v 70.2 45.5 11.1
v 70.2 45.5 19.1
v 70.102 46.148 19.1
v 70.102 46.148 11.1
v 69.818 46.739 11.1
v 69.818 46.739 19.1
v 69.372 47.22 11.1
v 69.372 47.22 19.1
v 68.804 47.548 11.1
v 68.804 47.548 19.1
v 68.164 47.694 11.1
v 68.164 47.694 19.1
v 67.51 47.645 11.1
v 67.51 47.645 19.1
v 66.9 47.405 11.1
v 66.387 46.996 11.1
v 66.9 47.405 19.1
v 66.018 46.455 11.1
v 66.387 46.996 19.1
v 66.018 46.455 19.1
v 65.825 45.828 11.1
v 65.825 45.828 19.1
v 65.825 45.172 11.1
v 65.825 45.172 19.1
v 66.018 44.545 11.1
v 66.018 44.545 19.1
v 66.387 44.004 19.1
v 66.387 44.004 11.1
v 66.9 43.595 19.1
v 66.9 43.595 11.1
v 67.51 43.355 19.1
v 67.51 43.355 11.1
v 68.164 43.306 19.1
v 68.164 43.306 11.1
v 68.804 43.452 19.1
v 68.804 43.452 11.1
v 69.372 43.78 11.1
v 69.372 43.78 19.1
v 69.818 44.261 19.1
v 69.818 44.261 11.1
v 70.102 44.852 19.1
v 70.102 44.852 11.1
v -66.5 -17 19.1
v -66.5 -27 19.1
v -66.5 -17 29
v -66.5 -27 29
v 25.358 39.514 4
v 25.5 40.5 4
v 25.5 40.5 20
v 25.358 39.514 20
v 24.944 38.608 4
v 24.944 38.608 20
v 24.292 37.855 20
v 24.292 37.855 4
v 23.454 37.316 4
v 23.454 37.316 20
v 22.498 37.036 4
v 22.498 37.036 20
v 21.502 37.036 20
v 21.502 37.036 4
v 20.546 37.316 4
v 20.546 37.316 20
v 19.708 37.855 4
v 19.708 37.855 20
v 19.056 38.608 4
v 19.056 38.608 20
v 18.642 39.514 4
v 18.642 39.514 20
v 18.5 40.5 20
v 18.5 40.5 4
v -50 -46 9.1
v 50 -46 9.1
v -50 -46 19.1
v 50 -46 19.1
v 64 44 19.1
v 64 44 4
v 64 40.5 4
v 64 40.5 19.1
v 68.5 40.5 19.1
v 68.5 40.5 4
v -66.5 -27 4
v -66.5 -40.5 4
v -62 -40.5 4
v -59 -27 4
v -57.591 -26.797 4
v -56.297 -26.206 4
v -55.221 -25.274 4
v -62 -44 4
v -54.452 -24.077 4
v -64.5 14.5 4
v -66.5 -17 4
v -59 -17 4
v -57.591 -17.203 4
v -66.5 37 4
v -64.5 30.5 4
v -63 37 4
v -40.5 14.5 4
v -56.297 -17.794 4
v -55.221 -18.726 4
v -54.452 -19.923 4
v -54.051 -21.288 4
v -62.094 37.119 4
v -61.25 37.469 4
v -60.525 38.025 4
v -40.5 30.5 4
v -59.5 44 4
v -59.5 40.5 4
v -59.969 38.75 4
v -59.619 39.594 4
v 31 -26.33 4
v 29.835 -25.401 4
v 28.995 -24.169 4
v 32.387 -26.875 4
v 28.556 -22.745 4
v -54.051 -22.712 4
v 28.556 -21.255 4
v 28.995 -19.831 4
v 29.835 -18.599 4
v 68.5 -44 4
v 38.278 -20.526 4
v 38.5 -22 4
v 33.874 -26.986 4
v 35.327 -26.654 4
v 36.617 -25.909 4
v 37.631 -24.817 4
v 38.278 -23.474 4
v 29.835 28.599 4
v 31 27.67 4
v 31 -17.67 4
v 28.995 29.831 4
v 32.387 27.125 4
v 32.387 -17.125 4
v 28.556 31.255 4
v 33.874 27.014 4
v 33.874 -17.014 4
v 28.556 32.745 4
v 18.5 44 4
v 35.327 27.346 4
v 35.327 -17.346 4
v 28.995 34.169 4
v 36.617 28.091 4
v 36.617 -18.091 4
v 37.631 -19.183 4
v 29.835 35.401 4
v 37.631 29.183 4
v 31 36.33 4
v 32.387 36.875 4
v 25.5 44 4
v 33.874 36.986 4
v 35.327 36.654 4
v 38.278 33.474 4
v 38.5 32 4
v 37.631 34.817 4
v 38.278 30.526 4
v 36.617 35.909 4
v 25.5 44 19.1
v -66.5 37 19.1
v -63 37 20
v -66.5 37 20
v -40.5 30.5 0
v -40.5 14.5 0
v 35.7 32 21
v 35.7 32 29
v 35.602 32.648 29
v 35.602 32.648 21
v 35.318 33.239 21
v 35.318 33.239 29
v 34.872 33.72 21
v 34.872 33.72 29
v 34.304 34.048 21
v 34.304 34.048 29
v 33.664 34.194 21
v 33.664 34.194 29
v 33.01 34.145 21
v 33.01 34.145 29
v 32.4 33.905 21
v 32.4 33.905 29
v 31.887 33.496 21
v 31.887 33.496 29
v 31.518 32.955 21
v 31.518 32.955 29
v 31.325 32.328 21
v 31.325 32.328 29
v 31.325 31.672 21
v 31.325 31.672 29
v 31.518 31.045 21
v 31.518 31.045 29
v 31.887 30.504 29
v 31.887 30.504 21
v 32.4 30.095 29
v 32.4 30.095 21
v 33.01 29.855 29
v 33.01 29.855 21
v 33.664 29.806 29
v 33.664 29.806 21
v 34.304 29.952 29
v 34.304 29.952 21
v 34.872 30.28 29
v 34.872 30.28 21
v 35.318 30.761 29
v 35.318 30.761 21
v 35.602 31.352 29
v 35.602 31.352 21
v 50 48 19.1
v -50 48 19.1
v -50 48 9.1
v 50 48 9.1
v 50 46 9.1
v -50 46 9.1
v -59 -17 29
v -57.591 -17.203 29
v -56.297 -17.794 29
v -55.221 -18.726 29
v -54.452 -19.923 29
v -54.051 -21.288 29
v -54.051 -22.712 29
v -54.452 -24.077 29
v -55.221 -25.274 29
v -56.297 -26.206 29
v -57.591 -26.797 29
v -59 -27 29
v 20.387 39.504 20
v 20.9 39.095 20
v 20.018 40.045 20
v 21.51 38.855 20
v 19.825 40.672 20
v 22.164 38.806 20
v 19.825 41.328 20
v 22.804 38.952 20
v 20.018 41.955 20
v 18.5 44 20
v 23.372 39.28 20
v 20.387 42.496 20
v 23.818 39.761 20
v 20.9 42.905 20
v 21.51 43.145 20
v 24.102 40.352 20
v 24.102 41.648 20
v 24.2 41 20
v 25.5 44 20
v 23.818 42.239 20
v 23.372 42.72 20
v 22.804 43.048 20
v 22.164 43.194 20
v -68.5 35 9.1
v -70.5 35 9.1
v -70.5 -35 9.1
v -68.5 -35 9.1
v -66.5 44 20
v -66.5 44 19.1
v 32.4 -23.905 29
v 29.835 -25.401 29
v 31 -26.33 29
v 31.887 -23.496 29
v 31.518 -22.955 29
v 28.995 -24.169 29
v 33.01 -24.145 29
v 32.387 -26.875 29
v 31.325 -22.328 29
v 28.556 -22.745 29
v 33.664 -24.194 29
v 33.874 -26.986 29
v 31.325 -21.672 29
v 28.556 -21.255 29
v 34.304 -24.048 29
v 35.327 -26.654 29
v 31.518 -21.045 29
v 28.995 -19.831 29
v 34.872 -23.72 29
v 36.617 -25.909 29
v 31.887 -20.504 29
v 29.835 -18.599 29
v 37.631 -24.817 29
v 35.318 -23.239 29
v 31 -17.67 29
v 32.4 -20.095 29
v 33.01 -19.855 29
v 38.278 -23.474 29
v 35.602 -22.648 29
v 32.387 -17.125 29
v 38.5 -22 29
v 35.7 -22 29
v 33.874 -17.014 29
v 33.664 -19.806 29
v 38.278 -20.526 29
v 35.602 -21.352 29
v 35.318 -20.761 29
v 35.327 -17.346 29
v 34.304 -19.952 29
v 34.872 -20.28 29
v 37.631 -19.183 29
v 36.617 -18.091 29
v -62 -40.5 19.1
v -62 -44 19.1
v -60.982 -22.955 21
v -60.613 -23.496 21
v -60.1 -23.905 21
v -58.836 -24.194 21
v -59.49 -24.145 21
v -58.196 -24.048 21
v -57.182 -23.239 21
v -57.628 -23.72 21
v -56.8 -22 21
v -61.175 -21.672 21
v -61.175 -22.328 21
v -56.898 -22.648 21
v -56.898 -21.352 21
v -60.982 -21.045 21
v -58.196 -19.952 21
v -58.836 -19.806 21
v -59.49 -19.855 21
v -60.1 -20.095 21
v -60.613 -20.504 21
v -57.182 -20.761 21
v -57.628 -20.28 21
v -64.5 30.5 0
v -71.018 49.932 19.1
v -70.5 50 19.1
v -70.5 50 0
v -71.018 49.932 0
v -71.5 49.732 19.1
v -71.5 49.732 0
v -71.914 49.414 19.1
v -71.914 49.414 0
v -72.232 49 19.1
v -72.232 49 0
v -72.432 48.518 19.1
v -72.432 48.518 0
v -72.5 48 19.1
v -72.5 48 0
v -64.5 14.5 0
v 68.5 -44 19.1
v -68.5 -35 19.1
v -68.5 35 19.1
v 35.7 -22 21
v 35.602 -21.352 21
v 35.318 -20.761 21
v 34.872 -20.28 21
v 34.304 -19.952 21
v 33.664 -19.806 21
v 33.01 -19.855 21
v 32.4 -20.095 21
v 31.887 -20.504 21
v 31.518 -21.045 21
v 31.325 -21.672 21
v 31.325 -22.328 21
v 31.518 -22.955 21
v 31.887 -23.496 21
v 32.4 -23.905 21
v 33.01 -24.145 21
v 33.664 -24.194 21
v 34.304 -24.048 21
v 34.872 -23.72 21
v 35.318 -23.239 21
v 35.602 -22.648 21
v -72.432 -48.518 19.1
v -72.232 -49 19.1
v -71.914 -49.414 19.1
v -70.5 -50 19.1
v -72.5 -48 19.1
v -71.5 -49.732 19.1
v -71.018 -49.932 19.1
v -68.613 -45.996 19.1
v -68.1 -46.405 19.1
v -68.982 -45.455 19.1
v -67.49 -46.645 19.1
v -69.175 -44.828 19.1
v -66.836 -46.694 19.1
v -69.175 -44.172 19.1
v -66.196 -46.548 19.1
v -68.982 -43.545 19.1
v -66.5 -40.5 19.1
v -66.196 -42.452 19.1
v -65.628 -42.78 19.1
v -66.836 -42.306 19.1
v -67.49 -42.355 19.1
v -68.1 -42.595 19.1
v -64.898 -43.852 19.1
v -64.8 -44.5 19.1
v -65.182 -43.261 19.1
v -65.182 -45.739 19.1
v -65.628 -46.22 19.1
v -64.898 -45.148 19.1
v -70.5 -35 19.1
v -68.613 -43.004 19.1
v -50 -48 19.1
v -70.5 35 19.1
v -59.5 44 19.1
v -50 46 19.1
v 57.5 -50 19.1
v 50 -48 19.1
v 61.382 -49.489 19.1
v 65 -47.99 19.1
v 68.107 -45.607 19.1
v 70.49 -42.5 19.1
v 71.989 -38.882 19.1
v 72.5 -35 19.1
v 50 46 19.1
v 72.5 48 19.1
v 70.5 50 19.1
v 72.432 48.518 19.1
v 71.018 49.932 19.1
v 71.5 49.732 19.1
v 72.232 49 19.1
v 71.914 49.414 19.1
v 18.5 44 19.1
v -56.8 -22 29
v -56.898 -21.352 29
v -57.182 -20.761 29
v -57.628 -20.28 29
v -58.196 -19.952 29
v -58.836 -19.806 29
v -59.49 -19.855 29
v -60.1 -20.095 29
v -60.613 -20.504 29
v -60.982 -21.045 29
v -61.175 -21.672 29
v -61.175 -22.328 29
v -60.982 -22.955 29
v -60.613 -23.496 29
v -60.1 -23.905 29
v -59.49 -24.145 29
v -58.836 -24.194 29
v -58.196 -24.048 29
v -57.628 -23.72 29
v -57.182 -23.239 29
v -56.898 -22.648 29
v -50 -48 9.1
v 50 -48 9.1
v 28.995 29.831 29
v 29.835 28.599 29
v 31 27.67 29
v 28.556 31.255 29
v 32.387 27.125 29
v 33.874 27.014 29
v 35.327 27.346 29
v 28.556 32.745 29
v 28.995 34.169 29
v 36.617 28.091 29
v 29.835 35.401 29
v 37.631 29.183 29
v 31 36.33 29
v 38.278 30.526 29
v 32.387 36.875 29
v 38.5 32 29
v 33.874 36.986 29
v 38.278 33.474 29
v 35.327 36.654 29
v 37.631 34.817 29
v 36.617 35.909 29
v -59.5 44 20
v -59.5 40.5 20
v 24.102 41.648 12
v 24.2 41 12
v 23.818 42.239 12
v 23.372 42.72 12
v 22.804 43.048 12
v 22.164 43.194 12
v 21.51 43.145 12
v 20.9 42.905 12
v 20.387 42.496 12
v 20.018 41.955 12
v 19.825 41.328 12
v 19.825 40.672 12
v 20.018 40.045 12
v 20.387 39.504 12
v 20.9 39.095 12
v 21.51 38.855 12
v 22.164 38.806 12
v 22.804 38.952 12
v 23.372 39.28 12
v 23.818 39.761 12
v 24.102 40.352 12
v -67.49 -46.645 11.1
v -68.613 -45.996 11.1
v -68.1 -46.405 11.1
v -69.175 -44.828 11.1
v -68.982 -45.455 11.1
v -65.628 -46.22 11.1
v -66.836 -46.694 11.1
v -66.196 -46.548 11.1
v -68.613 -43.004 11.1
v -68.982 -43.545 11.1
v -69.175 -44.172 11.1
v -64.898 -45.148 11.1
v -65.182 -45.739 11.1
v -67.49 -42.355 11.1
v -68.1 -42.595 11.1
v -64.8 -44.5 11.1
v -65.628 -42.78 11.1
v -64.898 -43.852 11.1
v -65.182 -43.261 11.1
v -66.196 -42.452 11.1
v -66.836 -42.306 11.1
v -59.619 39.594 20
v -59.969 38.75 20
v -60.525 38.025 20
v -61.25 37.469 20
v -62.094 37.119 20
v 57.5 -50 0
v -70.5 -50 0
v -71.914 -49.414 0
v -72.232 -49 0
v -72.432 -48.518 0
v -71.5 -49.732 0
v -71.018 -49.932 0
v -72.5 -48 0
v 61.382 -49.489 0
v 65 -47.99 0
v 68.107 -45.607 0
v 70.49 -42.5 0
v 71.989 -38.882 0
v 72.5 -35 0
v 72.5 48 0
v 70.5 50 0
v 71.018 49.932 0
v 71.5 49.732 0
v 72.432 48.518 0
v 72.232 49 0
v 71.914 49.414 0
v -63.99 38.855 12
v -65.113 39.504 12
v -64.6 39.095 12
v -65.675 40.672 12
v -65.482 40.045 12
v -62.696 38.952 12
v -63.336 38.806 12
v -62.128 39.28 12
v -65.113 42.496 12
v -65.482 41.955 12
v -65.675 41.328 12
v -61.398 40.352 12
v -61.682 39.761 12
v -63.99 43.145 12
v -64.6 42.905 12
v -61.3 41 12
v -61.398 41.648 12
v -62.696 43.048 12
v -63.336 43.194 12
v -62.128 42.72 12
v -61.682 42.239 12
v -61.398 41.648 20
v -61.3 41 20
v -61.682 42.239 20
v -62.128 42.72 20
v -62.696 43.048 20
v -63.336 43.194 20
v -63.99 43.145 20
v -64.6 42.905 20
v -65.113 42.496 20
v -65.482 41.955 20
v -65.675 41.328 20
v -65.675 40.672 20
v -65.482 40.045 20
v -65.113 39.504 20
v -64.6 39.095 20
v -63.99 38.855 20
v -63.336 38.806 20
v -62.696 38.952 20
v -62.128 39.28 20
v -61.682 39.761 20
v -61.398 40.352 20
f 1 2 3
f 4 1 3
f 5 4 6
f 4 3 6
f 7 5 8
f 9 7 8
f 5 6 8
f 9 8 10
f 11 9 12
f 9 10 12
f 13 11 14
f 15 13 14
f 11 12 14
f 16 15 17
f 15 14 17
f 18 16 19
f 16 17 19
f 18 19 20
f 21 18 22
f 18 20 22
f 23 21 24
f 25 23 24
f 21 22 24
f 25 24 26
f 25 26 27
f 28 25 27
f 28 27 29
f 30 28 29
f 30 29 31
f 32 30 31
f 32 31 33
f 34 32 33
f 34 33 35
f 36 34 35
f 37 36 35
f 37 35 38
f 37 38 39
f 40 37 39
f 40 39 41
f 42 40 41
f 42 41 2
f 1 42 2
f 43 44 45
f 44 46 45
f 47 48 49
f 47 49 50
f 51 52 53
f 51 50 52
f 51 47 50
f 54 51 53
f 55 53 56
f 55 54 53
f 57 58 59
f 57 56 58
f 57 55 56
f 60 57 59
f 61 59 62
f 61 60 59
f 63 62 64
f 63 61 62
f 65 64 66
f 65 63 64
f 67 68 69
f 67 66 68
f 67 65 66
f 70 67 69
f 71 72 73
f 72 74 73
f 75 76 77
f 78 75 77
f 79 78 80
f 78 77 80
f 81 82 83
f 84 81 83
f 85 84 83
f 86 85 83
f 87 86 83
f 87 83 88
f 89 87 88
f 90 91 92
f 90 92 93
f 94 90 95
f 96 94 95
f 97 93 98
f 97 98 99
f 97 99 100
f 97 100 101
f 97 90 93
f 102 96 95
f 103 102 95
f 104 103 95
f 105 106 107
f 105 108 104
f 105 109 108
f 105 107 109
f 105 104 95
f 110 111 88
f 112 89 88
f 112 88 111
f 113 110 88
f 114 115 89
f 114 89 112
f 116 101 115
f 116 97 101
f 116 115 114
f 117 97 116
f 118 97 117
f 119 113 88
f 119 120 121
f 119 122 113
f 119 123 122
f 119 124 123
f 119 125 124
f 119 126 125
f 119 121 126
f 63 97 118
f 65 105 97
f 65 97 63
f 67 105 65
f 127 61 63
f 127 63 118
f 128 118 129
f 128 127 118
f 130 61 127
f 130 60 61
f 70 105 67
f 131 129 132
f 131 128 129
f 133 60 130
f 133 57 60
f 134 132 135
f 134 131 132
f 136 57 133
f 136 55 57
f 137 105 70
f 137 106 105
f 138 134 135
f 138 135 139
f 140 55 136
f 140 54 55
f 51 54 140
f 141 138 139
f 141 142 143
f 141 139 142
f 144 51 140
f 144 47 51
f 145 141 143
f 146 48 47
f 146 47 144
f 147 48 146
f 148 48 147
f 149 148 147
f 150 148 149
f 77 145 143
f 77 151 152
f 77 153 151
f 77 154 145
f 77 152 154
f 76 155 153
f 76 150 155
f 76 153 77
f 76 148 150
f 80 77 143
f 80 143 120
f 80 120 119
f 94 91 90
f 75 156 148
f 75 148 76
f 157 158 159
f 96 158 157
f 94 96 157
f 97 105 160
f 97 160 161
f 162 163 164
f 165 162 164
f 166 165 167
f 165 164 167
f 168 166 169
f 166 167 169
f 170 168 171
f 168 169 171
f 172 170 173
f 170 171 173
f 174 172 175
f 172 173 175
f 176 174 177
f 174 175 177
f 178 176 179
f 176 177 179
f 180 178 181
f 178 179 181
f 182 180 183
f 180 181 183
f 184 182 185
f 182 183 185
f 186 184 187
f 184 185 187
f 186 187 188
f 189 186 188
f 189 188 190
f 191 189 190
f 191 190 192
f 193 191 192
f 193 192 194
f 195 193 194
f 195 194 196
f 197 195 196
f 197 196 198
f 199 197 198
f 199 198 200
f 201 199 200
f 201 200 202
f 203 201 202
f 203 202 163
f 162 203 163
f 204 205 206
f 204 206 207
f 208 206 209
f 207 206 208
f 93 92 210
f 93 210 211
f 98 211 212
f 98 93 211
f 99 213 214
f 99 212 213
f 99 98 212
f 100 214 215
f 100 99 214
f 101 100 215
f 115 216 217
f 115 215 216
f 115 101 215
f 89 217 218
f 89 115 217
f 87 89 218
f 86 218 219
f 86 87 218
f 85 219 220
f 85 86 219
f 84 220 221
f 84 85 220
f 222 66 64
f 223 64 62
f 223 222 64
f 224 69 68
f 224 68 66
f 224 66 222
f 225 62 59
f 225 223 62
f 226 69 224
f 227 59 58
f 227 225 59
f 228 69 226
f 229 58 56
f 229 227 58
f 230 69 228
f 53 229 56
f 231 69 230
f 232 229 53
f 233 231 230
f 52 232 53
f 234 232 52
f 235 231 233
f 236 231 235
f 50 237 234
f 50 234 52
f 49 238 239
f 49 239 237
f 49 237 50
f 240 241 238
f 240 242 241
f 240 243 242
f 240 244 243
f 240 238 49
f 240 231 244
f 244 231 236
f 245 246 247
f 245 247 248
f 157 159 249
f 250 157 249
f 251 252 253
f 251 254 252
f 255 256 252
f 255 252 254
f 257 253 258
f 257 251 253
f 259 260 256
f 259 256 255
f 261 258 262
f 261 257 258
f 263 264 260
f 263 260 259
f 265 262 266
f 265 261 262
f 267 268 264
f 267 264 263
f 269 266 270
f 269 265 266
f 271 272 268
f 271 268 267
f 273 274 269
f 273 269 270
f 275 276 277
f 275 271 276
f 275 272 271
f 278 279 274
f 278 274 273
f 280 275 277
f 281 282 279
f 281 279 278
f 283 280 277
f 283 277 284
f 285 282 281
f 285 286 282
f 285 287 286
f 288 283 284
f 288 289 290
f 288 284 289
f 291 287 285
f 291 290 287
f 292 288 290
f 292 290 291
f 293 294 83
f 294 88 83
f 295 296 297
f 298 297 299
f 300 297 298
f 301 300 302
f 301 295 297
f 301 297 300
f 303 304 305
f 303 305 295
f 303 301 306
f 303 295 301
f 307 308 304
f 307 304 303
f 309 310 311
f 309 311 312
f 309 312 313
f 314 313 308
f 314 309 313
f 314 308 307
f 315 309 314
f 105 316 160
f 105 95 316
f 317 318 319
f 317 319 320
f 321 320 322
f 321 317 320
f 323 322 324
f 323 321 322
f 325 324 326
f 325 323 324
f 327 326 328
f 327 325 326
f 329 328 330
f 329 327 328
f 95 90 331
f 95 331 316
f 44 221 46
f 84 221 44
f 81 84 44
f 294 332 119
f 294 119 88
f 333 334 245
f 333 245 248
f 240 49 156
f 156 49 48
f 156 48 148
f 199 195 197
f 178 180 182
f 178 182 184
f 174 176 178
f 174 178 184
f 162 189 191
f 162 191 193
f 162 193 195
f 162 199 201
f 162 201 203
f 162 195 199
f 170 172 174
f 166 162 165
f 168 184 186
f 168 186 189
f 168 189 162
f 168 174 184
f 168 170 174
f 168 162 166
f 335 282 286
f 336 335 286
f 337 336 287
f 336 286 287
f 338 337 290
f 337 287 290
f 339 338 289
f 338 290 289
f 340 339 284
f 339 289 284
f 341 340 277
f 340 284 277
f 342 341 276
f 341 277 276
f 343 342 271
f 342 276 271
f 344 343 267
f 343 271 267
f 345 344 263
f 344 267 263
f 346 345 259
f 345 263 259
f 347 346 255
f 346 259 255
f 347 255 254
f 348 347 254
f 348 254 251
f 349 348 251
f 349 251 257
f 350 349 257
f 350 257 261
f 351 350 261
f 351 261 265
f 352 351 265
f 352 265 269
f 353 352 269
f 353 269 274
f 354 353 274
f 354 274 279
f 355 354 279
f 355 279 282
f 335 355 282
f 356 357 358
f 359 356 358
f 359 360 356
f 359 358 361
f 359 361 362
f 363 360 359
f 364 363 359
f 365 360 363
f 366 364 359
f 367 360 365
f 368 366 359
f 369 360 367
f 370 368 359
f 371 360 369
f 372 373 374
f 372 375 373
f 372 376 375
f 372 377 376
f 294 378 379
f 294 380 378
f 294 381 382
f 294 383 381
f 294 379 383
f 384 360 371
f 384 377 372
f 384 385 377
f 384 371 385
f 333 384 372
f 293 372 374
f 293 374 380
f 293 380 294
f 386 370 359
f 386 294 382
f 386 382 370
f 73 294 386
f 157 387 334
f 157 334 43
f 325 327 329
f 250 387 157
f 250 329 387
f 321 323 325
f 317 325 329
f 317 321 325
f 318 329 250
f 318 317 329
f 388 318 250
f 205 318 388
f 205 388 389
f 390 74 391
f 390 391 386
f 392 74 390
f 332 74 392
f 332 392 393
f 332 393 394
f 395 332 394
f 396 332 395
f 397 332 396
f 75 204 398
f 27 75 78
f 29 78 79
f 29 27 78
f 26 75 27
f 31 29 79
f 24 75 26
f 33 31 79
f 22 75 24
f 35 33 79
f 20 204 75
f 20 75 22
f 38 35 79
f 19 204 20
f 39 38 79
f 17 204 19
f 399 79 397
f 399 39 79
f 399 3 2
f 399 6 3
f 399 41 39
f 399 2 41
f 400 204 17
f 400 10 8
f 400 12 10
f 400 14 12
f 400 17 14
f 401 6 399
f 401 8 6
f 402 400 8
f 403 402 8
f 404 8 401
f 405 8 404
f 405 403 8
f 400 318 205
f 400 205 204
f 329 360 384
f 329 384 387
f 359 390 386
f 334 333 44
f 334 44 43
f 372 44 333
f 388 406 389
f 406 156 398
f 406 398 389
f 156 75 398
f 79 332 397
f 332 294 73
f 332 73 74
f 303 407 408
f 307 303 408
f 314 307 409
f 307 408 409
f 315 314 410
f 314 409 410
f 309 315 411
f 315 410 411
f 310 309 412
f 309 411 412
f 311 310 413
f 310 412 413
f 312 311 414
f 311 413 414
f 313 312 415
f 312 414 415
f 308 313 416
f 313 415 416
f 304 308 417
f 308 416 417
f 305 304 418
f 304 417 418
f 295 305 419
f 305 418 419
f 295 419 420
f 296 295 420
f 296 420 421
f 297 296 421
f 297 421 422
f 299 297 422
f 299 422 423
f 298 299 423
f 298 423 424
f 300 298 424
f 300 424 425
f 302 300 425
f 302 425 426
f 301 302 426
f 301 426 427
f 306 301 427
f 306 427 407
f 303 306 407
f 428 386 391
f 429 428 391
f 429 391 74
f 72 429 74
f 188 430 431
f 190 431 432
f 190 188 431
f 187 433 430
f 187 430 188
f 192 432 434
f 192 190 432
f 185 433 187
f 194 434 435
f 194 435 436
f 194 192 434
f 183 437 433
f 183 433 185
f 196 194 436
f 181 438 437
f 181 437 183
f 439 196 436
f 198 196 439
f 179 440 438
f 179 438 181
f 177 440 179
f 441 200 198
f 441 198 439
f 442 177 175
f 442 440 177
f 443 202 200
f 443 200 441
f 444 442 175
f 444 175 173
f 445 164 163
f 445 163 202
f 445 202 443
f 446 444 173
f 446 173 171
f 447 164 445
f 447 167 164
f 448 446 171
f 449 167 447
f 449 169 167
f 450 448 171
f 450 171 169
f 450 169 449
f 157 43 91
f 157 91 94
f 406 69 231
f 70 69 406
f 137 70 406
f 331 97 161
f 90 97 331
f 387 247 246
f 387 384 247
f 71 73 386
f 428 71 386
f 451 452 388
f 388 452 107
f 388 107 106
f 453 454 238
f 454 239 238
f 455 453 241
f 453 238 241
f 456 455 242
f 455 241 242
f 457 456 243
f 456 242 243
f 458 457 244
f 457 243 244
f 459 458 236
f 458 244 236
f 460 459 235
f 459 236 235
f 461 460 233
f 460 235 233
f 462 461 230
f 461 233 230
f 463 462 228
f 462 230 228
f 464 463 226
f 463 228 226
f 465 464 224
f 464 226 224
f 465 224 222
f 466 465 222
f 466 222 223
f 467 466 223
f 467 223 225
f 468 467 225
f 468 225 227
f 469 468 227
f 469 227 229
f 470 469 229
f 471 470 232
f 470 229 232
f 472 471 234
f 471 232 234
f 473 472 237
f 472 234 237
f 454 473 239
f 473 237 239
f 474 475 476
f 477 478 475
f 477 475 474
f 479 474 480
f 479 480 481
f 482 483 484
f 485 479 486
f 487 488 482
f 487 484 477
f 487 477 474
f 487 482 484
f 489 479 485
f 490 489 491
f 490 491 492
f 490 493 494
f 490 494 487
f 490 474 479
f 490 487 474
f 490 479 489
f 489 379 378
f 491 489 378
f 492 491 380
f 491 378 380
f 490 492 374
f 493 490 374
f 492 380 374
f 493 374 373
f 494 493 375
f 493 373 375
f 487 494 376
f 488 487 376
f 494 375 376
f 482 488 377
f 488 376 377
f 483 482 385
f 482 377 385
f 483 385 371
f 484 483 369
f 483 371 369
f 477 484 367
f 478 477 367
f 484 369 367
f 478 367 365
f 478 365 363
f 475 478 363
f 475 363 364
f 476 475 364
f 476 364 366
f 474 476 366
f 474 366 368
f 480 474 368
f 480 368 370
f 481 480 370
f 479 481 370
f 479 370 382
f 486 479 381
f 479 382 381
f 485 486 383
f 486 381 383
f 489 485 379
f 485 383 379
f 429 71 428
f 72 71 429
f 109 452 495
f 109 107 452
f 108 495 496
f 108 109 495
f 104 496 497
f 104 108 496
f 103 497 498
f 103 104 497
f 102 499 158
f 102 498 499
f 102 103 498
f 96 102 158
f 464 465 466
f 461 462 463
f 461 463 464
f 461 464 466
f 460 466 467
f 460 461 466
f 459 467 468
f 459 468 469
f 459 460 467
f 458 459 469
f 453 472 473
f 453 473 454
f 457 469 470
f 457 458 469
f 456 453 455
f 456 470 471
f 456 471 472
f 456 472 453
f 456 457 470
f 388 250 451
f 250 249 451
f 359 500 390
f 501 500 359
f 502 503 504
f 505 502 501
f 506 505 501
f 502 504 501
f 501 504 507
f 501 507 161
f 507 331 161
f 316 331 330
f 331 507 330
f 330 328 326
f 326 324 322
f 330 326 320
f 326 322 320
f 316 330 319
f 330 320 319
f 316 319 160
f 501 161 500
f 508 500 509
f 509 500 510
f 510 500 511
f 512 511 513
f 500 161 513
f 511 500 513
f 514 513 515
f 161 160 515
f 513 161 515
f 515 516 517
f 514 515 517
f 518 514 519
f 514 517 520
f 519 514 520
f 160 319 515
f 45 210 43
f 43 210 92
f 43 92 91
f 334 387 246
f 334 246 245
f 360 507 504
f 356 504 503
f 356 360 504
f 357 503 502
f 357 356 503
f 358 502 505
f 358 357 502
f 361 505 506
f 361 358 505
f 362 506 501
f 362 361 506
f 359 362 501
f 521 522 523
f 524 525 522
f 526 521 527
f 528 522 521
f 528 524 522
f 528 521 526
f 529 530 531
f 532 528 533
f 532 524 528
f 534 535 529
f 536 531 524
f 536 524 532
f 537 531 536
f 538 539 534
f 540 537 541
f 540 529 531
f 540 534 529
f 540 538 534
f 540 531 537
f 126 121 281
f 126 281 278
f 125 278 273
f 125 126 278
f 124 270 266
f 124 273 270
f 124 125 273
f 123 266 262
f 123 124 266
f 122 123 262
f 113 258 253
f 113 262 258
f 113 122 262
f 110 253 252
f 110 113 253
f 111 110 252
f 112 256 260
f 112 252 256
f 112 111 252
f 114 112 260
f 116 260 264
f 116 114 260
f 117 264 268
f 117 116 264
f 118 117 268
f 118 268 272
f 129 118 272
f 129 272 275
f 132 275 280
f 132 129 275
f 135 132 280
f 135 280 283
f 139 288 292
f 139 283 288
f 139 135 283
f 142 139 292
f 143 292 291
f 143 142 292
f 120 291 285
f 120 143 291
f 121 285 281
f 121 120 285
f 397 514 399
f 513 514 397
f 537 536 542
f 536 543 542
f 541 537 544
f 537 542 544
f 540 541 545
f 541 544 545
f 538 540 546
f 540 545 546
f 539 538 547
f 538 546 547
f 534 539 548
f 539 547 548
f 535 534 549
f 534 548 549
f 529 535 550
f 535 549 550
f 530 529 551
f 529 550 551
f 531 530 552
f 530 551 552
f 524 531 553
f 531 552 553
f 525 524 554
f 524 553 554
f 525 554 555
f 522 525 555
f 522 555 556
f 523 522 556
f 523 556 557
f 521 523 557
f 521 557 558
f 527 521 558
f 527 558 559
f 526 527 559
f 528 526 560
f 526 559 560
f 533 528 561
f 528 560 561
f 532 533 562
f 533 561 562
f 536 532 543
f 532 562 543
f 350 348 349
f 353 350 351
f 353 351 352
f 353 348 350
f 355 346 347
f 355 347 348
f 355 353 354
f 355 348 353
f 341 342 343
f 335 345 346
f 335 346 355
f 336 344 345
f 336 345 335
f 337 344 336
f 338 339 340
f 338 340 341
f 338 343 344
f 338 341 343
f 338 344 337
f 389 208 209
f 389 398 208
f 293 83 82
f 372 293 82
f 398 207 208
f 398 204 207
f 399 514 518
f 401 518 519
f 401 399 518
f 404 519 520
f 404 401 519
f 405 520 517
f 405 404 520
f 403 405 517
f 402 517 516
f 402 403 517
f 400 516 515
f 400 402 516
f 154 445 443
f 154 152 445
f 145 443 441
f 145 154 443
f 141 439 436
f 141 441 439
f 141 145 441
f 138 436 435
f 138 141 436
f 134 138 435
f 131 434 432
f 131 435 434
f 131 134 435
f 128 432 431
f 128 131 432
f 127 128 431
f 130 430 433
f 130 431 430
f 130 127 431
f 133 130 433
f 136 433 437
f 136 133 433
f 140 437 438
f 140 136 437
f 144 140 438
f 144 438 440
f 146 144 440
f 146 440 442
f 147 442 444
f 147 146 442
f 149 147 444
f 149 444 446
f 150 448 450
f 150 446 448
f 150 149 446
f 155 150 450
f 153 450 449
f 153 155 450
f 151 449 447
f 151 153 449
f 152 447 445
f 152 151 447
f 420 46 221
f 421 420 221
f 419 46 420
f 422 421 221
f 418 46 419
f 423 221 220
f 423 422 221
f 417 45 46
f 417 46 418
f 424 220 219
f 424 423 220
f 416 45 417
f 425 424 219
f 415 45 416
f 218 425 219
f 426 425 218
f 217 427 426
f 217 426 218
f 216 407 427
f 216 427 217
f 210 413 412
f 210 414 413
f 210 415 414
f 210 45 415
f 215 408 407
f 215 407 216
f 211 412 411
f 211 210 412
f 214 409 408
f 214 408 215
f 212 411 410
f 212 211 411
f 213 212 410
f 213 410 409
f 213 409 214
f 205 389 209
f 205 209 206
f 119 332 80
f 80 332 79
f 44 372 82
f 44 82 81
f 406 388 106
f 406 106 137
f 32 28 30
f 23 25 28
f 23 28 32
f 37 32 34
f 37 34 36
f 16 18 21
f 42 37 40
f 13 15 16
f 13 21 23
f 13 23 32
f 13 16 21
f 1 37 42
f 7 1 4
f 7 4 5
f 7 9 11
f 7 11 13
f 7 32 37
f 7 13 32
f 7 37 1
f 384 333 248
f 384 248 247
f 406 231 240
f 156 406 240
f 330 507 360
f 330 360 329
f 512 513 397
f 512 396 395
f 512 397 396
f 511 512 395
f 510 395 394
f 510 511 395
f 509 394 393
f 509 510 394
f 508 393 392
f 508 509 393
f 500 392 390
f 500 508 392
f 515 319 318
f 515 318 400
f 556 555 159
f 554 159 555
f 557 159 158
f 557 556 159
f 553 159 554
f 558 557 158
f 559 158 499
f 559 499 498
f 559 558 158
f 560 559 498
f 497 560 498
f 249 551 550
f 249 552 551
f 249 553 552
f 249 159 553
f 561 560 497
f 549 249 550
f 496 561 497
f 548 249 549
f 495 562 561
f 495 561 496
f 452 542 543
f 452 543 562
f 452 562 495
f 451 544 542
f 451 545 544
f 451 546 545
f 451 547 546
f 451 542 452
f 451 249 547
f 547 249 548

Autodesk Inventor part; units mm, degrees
ref_plane "YZ Plane" through (0, 0, 0) normal (1, 0, 0) x (0, 1, 0)
ref_plane "XZ Plane" through (0, 0, 0) normal (0, 1, 0) x (-1, 0, 0)
ref_plane "XY Plane" through (0, 0, 0) normal (0, 0, 1) x (1, 0, 0)
sketch "Náčrt1" plane through (0, 0, 0) normal (0, 0, 1) x (1, 0, 0)
  line L0 (0, 71.6213) -> (0, -79.7279) projected
  line L1 (-102.1213, 0) -> (105.2279, 0) projected
  line L2 (-72.5, 50) -> (72.5, 50)
  line L3 (72.5, 50) -> (72.5, -35)
  line L4 (57.5, -50) -> (-72.5, -50)
  line L5 (-72.5, -50) -> (-72.5, 50)
  arc A0 (57.5, -50) -> (72.5, -35) centre (57.5, -35) ccw
  point P0 (0, 0)
  point P1 (-72.5, 0)
  point P2 (0, -50)
  point P3 (0, 50)
  point P4 (72.5, 0)
  dimension "d0" = 130
  dimension "d1" = 100
  dimension "d2" = 30
extrude "Vysunutí1" add sketch "Náčrt1" along normal blind 33
sketch "Náčrt2" plane through (0, 0, 33) normal (0, 0, 1) x (1, 0, 0)
  line L0 (-72.5, -50) -> (57.5, -50) projected
  arc A0 (57.5, -50) -> (72.5, -35) centre (57.5, -35) ccw projected
  line L1 (72.5, -35) -> (72.5, 50) projected
  line L2 (72.5, 50) -> (-72.5, 50) projected
  line L3 (-72.5, 50) -> (-72.5, -50) projected
  line L4 (-66.5, 44) -> (68.5, 44)
  line L5 (68.5, 44) -> (68.5, -31.5)
  line L6 (54, -44) -> (-66.5, -44)
  line L7 (-66.5, -44) -> (-66.5, 44)
  line L8 (54, -44) -> (68.5, -44)
  line L9 (68.5, -44) -> (68.5, -31.5)
  point P0 (0, 0)
  dimension "d5" = 4
  dimension "d6" = 6
  dimension "d7" = 6
  dimension "d8" = 6
extrude "Vysunutí2" cut sketch "Náčrt2" against normal blind 29 contours L4 L5 L9 L8 L6 L7
fillet "Zaoblení1" radius 2 1 edges at (72.5, 50, 16.5)
fillet "Zaoblení2" radius 2 2 edges at (-72.5, 50, 16.5) (-72.5, -50, 16.5)
sketch "Náčrt3" plane through (0, 0, 4) normal (0, 0, 1) x (1, 0, 0)
  line L0 (68.5, 44) -> (68.5, -44) projected
  line L1 (-66.5, 44) -> (68.5, 44) projected
  line L2 (-66.5, -44) -> (-66.5, 44) projected
  line L3 (68.5, -44) -> (-66.5, -44) projected
  arc A0 (-72.5, -48) -> (-70.5, -50) centre (-70.5, -48) ccw projected
  line L4 (-70.5, -50) -> (57.5, -50) projected
  arc A1 (57.5, -50) -> (72.5, -35) centre (57.5, -35) ccw projected
  line L5 (72.5, -35) -> (72.5, 48) projected
  arc A2 (72.5, 48) -> (70.5, 50) centre (70.5, 48) ccw projected
  line L6 (70.5, 50) -> (-70.5, 50) projected
  arc A3 (-70.5, 50) -> (-72.5, 48) centre (-70.5, 48) ccw projected
  line L7 (-72.5, 48) -> (-72.5, -48) projected
  line L8 (-66.5, 44) -> (68.5, 44) projected
  line L9 (68.5, 44) -> (68.5, -44) projected
  line L10 (68.5, -44) -> (-66.5, -44) projected
  line L11 (-66.5, -44) -> (-66.5, 44) projected
  arc A4 (-63, 37) -> (-59.5, 40.5) centre (-63, 40.5) ccw
  line L12 (-66.5, 44) -> (68.5, 44) projected
  line L13 (-66.5, -44) -> (-66.5, 44) projected
  line L14 (-59.5, 40.5) -> (-59.5, 44)
  line L15 (-63, 37) -> (-66.5, 37)
  arc A5 (18.5, 40.5) -> (25.5, 40.5) centre (22, 40.5) ccw
  line L16 (25.5, 40.5) -> (25.5, 44)
  line L17 (18.5, 40.5) -> (18.5, 44)
  circle A6 centre (33.5, 32) radius 5
  circle A7 centre (20.5, -20.4118) radius 5
  arc A8 (-58.5, 21.7369) -> (-58.5, 31.7369) centre (-58.5, 26.7369) ccw
  line L18 (-58.5, 31.7369) -> (-66.5, 31.7369)
  line L19 (-58.5, 21.7369) -> (-66.5, 21.7369)
  point P0 (0, 0)
  point P1 (25.5, 42.25)
  point P2 (25.5, 44)
  point P3 (18.5, 44)
  point P4 (-66.5, 37)
  dimension "d14" = 7
  dimension "d15" = 7
  dimension "d16" = 85
  dimension "d17" = 10
  dimension "d18" = 8
  dimension "d19" = 8.5
  dimension "d20" = 10
  dimension "d21" = 54
  dimension "d22" = 48
  dimension "d23" = 10
  dimension "d24" = 92
  dimension "d25" = 8
extrude "Vysunutí3" add sketch "Náčrt3" along normal blind 16 contours L16 A5 L17 L1 | L14 A4 L15 L2 L1
sketch "Náčrt4" plane through (0, 0, 4) normal (0, 0, 1) x (1, 0, 0)
  line L0 (25.5, 44) -> (25.5, 40.5) projected
  arc A0 (18.5, 40.5) -> (25.5, 40.5) centre (22, 40.5) ccw projected
  line L1 (18.5, 40.5) -> (18.5, 44) projected
  line L2 (-59.5, 44) -> (18.5, 44) projected
  line L3 (-59.5, 44) -> (-59.5, 40.5) projected
  arc A1 (-63, 37) -> (-59.5, 40.5) centre (-63, 40.5) ccw projected
  line L4 (-63, 37) -> (-66.5, 37) projected
  line L5 (-66.5, -44) -> (-66.5, 37) projected
  line L6 (68.5, -44) -> (-66.5, -44) projected
  line L7 (68.5, 44) -> (68.5, -44) projected
  line L8 (25.5, 44) -> (68.5, 44) projected
  circle A2 centre (33.5, 32) radius 5
  circle A3 centre (33.5, -22) radius 5
  circle A4 centre (-59, -22) radius 5
  line L9 (-59, -17) -> (-66.5, -17)
  line L10 (-59, -27) -> (-66.5, -27)
  point P0 (0, 0)
  dimension "d28" = 10
  dimension "d29" = 10
  dimension "d30" = 10
  dimension "d31" = 8
  dimension "d32" = 8.5
  dimension "d33" = 54
  dimension "d61" = 92.5
  dimension "d62" = 7.5
  dimension "d77" = 100
extrude "Vysunutí4" add sketch "Náčrt4" along normal blind 25 contours L5 L9 A4 L10 | A4 | A2 | A3
sketch "Náčrt6" plane through (0, 0, 4) normal (0, 0, 1) x (1, 0, 0)
  line L0 (-64.5, 30.5) -> (-40.5, 30.5)
  line L1 (-40.5, 30.5) -> (-40.5, 14.5)
  line L2 (-40.5, 14.5) -> (-64.5, 14.5)
  line L3 (-64.5, 14.5) -> (-64.5, 30.5)
  line L4 (-66.5, 44) -> (68.5, 44) projected
  line L5 (-66.5, -44) -> (-66.5, 44) projected
  point P0 (0, 0)
  dimension "d41" = 24
  dimension "d42" = 16
  dimension "d43" = 13.5
  dimension "d44" = 2
extrude "Vysunutí5" cut sketch "Náčrt6" against normal blind 33
sketch "Náčrt8" plane through (0, 0, 33) normal (0, 0, 1) x (1, 0, 0)
  arc A0 (-72.5, -48) -> (-70.5, -50) centre (-70.5, -48) ccw projected
  line L0 (-70.5, -50) -> (57.5, -50) projected
  arc A1 (57.5, -50) -> (72.5, -35) centre (57.5, -35) ccw projected
  line L1 (72.5, -35) -> (72.5, 48) projected
  arc A2 (72.5, 48) -> (70.5, 50) centre (70.5, 48) ccw projected
  line L2 (70.5, 50) -> (-70.5, 50) projected
  arc A3 (-70.5, 50) -> (-72.5, 48) centre (-70.5, 48) ccw projected
  line L3 (-72.5, 48) -> (-72.5, -48) projected
  line L4 (-66.5, 44) -> (68.5, 44) projected
  line L5 (68.5, 44) -> (68.5, -44) projected
  line L6 (68.5, -44) -> (-66.5, -44) projected
  line L7 (-66.5, -44) -> (-66.5, 44) projected
  line L8 (-66.5, 44) -> (68.5, 44)
  line L9 (68.5, 44) -> (68.5, -44)
  line L10 (68.5, -44) -> (-66.5, -44)
  line L11 (-66.5, -44) -> (-66.5, 44)
  arc A4 (57.5, -50) -> (72.5, -35) centre (57.5, -35) ccw
  line L12 (72.5, -35) -> (72.5, 48.1384)
  line L13 (70.5, 50) -> (-70.5, 50)
  line L14 (-72.5, 48) -> (-72.5, -48)
  line L15 (-70.5, -50) -> (57.5, -50)
  circle A5 centre (-70.5, -48) radius 2
  circle A6 centre (-70.5, 48) radius 2
  circle A7 centre (70.5, 48) radius 2
  point P0 (0, 0)
extrude "Vysunutí6" cut sketch "Náčrt8" against normal blind 13.9
sketch "Náčrt9" plane through (0, 0, 20) normal (0, 0, 1) x (1, 0, 0)
  line L0 (-59.5, 40.5) -> (-59.5, 44) projected
  line L1 (-66.5, 44) -> (-59.5, 44) projected
  line L2 (-66.5, 37) -> (-66.5, 44) projected
  line L3 (-66.5, 37) -> (-63, 37) projected
  arc A0 (-63, 37) -> (-59.5, 40.5) centre (-63, 40.5) ccw projected
  line L4 (25.5, 40.5) -> (25.5, 44) projected
  line L5 (18.5, 44) -> (25.5, 44) projected
  line L6 (18.5, 44) -> (18.5, 40.5) projected
  arc A1 (18.5, 40.5) -> (25.5, 40.5) centre (22, 40.5) ccw projected
  circle A2 centre (-63.5, 41) radius 2.2
  circle A3 centre (22, 41) radius 2.2
  point P0 (0, 0)
  dimension "d49" = 4.4
  dimension "d50" = 3
  dimension "d51" = 3
  dimension "d52" = 4.4
  dimension "d53" = 3
  dimension "d54" = 3.5
extrude "Vysunutí7" cut sketch "Náčrt9" against normal blind 8 contours A2 | A3
sketch "Náčrt10" plane through (33.5, 32, 29) normal (0, 0, 1) x (1, 0, 0)
  circle A0 centre (0, 0) radius 5 projected
  circle A1 centre (0, -54) radius 5 projected
  line L0 (-92.5, -49) -> (-100, -49) projected
  line L1 (-100, -59) -> (-100, -49) projected
  line L2 (-100, -59) -> (-92.5, -59) projected
  arc A2 (-92.5, -59) -> (-92.5, -49) centre (-92.5, -54) ccw projected
  circle A3 centre (0, 0) radius 2.2
  circle A4 centre (0, -54) radius 2.2
  point P0 (-33.5, -32)
  dimension "d57" = 4.4
  dimension "d58" = 4.4
extrude "Vysunutí8" cut sketch "Náčrt10" against normal blind 8 contours A3 | A4
sketch "Náčrt11" plane through (0, 0, 29) normal (0, 0, 1) x (1, 0, 0)
  line L0 (-59, -17) -> (-66.5, -17) projected
  line L1 (-66.5, -27) -> (-66.5, -17) projected
  line L2 (-66.5, -27) -> (-59, -27) projected
  arc A0 (-59, -27) -> (-59, -17) centre (-59, -22) ccw projected
  circle A1 centre (-59, -22) radius 2.2
  point P0 (0, 0)
  dimension "d63" = 4.4
extrude "Vysunutí9" cut sketch "Náčrt11" against normal blind 8 contours A1
sketch "Náčrt12" plane through (0, 0, 20) normal (0, 0, 1) x (1, 0, 0)
  line L0 (-66.5, 37) -> (-63, 37) projected
  circle A0 centre (-63.5, 41) radius 2.2 projected
  line L1 (-59.5, 40.5) -> (-59.5, 44) projected
  line L2 (-66.5, 44) -> (-59.5, 44) projected
  line L3 (-66.5, 37) -> (-66.5, 44) projected
  line L4 (-66.5, 37) -> (-63, 37) projected
  arc A1 (-63, 37) -> (-59.5, 40.5) centre (-63, 40.5) ccw projected
  circle A2 centre (22, 41) radius 2.2 projected
  line L5 (25.5, 40.5) -> (25.5, 44) projected
  line L6 (18.5, 44) -> (25.5, 44) projected
  line L7 (18.5, 44) -> (18.5, 40.5) projected
  arc A3 (18.5, 40.5) -> (25.5, 40.5) centre (22, 40.5) ccw projected
  line L8 (-65.9036, 43.7615) -> (24.0964, 43.7615) construction
  line L9 (24.0964, 43.7615) -> (24.0964, -3.2385) construction
  line L10 (24.0964, -3.2385) -> (-65.9036, -3.2385) construction
  line L11 (-65.9036, -3.2385) -> (-65.9036, 43.7615) construction
  point P0 (0, 0)
  dimension "d66" = 90
  dimension "d67" = 47
sketch "Náčrt13" plane through (0, 0, 29) normal (0, 0, 1) x (1, 0, 0)
  circle A0 centre (-59, -22) radius 2.2 projected
  line L0 (-59, -17) -> (-66.5, -17) projected
  line L1 (-66.5, -27) -> (-66.5, -17) projected
  line L2 (-66.5, -27) -> (-59, -27) projected
  arc A1 (-59, -27) -> (-59, -17) centre (-59, -22) ccw projected
  circle A2 centre (33.5, -22) radius 2.2 projected
  circle A3 centre (33.5, -22) radius 5 projected
  circle A4 centre (33.5, 32) radius 5 projected
  circle A5 centre (33.5, 32) radius 2.2 projected
  line L3 (-62.1019, -25.0857) -> (36.3981, -25.0857) construction
  line L4 (36.3981, -25.0857) -> (36.3981, 34.9143) construction
  line L5 (36.3981, 34.9143) -> (-62.1019, 34.9143) construction
  line L6 (-62.1019, 34.9143) -> (-62.1019, -25.0857) construction
  point P0 (0, 0)
  dimension "d68" = 98.5
  dimension "d69" = 60
sketch "Náčrt15" plane through (0, 0, 4) normal (0, 0, 1) x (1, 0, 0)
  line L0 (-70.5, 50) -> (70.5, 50) projected
  arc A0 (-70.5, 50) -> (-72.5, 48) centre (-70.5, 48) ccw projected
  line L1 (-72.5, -48) -> (-72.5, 48) projected
  arc A1 (-72.5, -48) -> (-70.5, -50) centre (-70.5, -48) ccw projected
  line L2 (57.5, -50) -> (-70.5, -50) projected
  arc A2 (57.5, -50) -> (72.5, -35) centre (57.5, -35) ccw projected
  line L3 (72.5, 48) -> (72.5, -35) projected
  arc A3 (72.5, 48) -> (70.5, 50) centre (70.5, 48) ccw projected
  line L4 (-66.5, 37) -> (-66.5, -17) projected
  line L5 (18.5, 44) -> (-59.5, 44) projected
  line L6 (68.5, -44) -> (68.5, 44) projected
  line L7 (-66.5, -44) -> (68.5, -44) projected
  line L8 (-66.5, -27) -> (-66.5, -44) projected
  line L9 (-66.5, -17) -> (-66.5, -27) projected
  line L10 (-66.5, 44) -> (-66.5, 37) projected
  line L11 (-59.5, 44) -> (-66.5, 44) projected
  line L12 (25.5, 44) -> (18.5, 44) projected
  line L13 (68.5, 44) -> (25.5, 44) projected
  point P0 (0, 0)
sketch "Náčrt16" plane through (0, 0, 4) normal (0, 0, 1) x (1, 0, 0)
  line L0 (68.5, -44) -> (-66.5, -44) projected
  line L1 (68.5, 44) -> (68.5, -44) projected
  line L2 (41.5, -44) -> (68.5, -44)
  line L3 (68.5, -44) -> (68.5, -40)
  arc A0 (57.5, -50) -> (72.5, -35) centre (57.5, -35) ccw construction
  point P0 (0, 0)
  point P1 (68.5, -23.5)
  point P2 (68.5, -30.5)
extrude "Vysunutí10" [suppressed]
sketch "Náčrt17" plane through (47, -27, 6) normal (0, 0, 1) x (1, 0, 0)
  circle A0 centre (0, 0) radius 3.5 projected
  line L0 (-117.5, 77) -> (23.5, 77) projected
  arc A1 (-117.5, 77) -> (-119.5, 75) centre (-117.5, 75) ccw projected
  line L1 (-119.5, -21) -> (-119.5, 75) projected
  arc A2 (-119.5, -21) -> (-117.5, -23) centre (-117.5, -21) ccw projected
  line L2 (10.5, -23) -> (-117.5, -23) projected
  arc A3 (10.5, -23) -> (25.5, -8) centre (10.5, -8) ccw projected
  line L3 (25.5, 75) -> (25.5, -8) projected
  arc A4 (25.5, 75) -> (23.5, 77) centre (23.5, 75) ccw projected
  line L4 (-113.5, 64) -> (-113.5, 10) projected
  line L5 (-28.5, 71) -> (-106.5, 71) projected
  line L6 (21.5, -17) -> (21.5, 71) projected
  line L7 (-113.5, -17) -> (21.5, -17) projected
  line L8 (17, -3.5) -> (21.5, -3.5) projected
  line L9 (21.5, 3.5) -> (21.5, -3.5) projected
  line L10 (21.5, 3.5) -> (17, 3.5) projected
  arc A5 (17, 3.5) -> (17, -3.5) centre (17, 0) ccw projected
  line L11 (21.5, 3.5) -> (21.5, -3.5) projected
  line L12 (-113.5, 0) -> (-113.5, -17) projected
  line L13 (-113.5, 10) -> (-113.5, 0) projected
  line L14 (-113.5, 71) -> (-113.5, 64) projected
  line L15 (-106.5, 71) -> (-113.5, 71) projected
  line L16 (-21.5, 71) -> (-28.5, 71) projected
  line L17 (21.5, 71) -> (-21.5, 71) projected
  line L18 (17, -3.5) -> (21.5, -3.5) projected
  line L19 (21.5, 3.5) -> (17, 3.5) projected
  arc A6 (17, 3.5) -> (17, -3.5) centre (17, 0) ccw projected
  point P0 (-47, 27)
hole "Díra1" [suppressed]
sketch "Náčrt19" plane through (33.5, -22, 29) normal (0, 0, 1) x (1, 0, 0)
  point P0 (-33.5, 22)
sketch "Náčrt20" plane through (0, 0, 19.1) normal (0, 0, 1) x (1, 0, 0)
  line L0 (-70.5, 50) -> (70.5, 50) projected
  arc A0 (-70.5, 50) -> (-72.5, 48) centre (-70.5, 48) ccw projected
  line L1 (-72.5, -48) -> (-72.5, 48) projected
  arc A1 (-72.5, -48) -> (-70.5, -50) centre (-70.5, -48) ccw projected
  line L2 (57.5, -50) -> (-70.5, -50) projected
  arc A2 (57.5, -50) -> (72.5, -35) centre (57.5, -35) ccw projected
  line L3 (72.5, 48) -> (72.5, -35) projected
  arc A3 (72.5, 48) -> (70.5, 50) centre (70.5, 48) ccw projected
  line L4 (-66.5, 37) -> (-66.5, -17) projected
  line L5 (18.5, 44) -> (-59.5, 44) projected
  line L6 (68.5, -44) -> (68.5, 44) projected
  line L7 (-66.5, -44) -> (68.5, -44) projected
  line L8 (-50, 48) -> (50, 48)
  line L9 (50, 48) -> (50, 46)
  line L10 (50, 46) -> (-50, 46)
  line L11 (-50, 46) -> (-50, 48)
  line L12 (0, 71.1184) -> (0, -73.8108) projected
  line L13 (-102.6184, 0) -> (105.3108, 0) projected
  line L14 (-50, -48) -> (50, -48)
  line L15 (50, -48) -> (50, -46)
  line L16 (50, -46) -> (-50, -46)
  line L17 (-50, -46) -> (-50, -48)
  line L18 (-70.5, 35) -> (-68.5, 35)
  line L19 (-68.5, 35) -> (-68.5, -35)
  line L20 (-68.5, -35) -> (-70.5, -35)
  line L21 (-70.5, -35) -> (-70.5, 35)
  line L22 (-66.5, -27) -> (-66.5, -44) projected
  line L23 (-66.5, -17) -> (-66.5, -27) projected
  line L24 (-66.5, 44) -> (-66.5, 37) projected
  line L25 (-59.5, 44) -> (-66.5, 44) projected
  line L26 (25.5, 44) -> (18.5, 44) projected
  line L27 (68.5, 44) -> (25.5, 44) projected
  point P0 (0, 0)
  dimension "d103" = 100
  dimension "d104" = 2
  dimension "d105" = 2
  dimension "d106" = 2
  dimension "d107" = 70
  dimension "d108" = 2
extrude "Vysunutí11" cut sketch "Náčrt20" against normal blind 10 contours L12 L10 L11 L8 | L8 L9 L10 L12 | L21 L18 L19 L13 | L13 L19 L20 L21 | L14 L17 L16 L12 | L12 L16 L15 L14
sketch "Náčrt22" plane through (0, 0, 4) normal (0, 0, 1) x (1, 0, 0)
  line L0 (50, -46) -> (50, -48) projected
  line L1 (50, -48) -> (-50, -48) projected
  line L2 (-50, -48) -> (-50, -46) projected
  line L3 (-50, -46) -> (50, -46) projected
  line L4 (-70.5, 35) -> (-68.5, 35) projected
  line L5 (-68.5, 35) -> (-68.5, -35) projected
  line L6 (-68.5, -35) -> (-70.5, -35) projected
  line L7 (-70.5, -35) -> (-70.5, 35) projected
  line L8 (-50, 46) -> (-50, 48) projected
  line L9 (-50, 48) -> (50, 48) projected
  line L10 (50, 48) -> (50, 46) projected
  line L11 (50, 46) -> (-50, 46) projected
  line L12 (-70.5, 50) -> (70.5, 50) projected
  arc A0 (-70.5, 50) -> (-72.5, 48) centre (-70.5, 48) ccw projected
  line L13 (-72.5, -48) -> (-72.5, 48) projected
  arc A1 (-72.5, -48) -> (-70.5, -50) centre (-70.5, -48) ccw projected
  line L14 (57.5, -50) -> (-70.5, -50) projected
  arc A2 (57.5, -50) -> (72.5, -35) centre (57.5, -35) ccw projected
  line L15 (72.5, 48) -> (72.5, -35) projected
  arc A3 (72.5, 48) -> (70.5, 50) centre (70.5, 48) ccw projected
  line L16 (-66.5, 44) -> (-66.5, 37) projected
  line L17 (-59.5, 44) -> (-66.5, 44) projected
  line L18 (18.5, 44) -> (-59.5, 44) projected
  line L19 (25.5, 44) -> (18.5, 44) projected
  line L20 (68.5, 44) -> (25.5, 44) projected
  line L21 (68.5, -44) -> (68.5, 44) projected
  line L22 (-66.5, -44) -> (68.5, -44) projected
  line L23 (-66.5, -27) -> (-66.5, -44) projected
  line L24 (-66.5, -17) -> (-66.5, -27) projected
  line L25 (-66.5, 37) -> (-66.5, -17) projected
  circle A4 centre (33.5, 32) radius 5 projected
  circle A5 centre (33.5, -22) radius 5 projected
  line L26 (68.5, 44) -> (68.5, -44) projected
  line L27 (25.5, 44) -> (68.5, 44) projected
  line L28 (25.5, 44) -> (25.5, 40.5) projected
  arc A6 (18.5, 40.5) -> (25.5, 40.5) centre (22, 40.5) ccw projected
  line L29 (18.5, 40.5) -> (18.5, 44) projected
  line L30 (-59.5, 44) -> (18.5, 44) projected
  line L31 (-59.5, 44) -> (-59.5, 40.5) projected
  arc A7 (-63, 37) -> (-59.5, 40.5) centre (-63, 40.5) ccw projected
  line L32 (-63, 37) -> (-66.5, 37) projected
  line L33 (-66.5, -17) -> (-66.5, 37) projected
  line L34 (-66.5, -17) -> (-59, -17) projected
  arc A8 (-59, -27) -> (-59, -17) centre (-59, -22) ccw projected
  line L35 (-59, -27) -> (-66.5, -27) projected
  line L36 (-66.5, -44) -> (-66.5, -27) projected
  line L37 (68.5, -44) -> (-66.5, -44) projected
  line L38 (-40.5, 30.5) -> (-40.5, 14.5) projected
  line L39 (-40.5, 14.5) -> (-64.5, 14.5) projected
  line L40 (-64.5, 14.5) -> (-64.5, 30.5) projected
  line L41 (-64.5, 30.5) -> (-40.5, 30.5) projected
  line L42 (68.5, 44) -> (64, 44)
  line L43 (64, 44) -> (64, 40.5)
  line L44 (64, 40.5) -> (68.5, 40.5)
  line L45 (68.5, 40.5) -> (68.5, 44)
  line L46 (-66.5, -44) -> (-66.5, -27) projected
  line L47 (-66.5, -44) -> (-62, -44)
  line L48 (-62, -44) -> (-62, -40.5)
  line L49 (-62, -40.5) -> (-66.5, -40.5)
  line L50 (-66.5, -40.5) -> (-66.5, -44)
  point P0 (0, 0)
  dimension "d119" = 4.5
  dimension "d120" = 3.5
  dimension "d121" = 4.5
  dimension "d122" = 3.5
extrude "Vysunutí13" add sketch "Náčrt22" along normal up to surface (15.1 mm away) contours L49 L48 L22 L23 | L20 L21 L44 L43
sketch "Náčrt23" plane through (0, 0, 19.1) normal (0, 0, 1) x (1, 0, 0)
  circle A0 centre (-67, -44.5) radius 2.2
  line L0 (57.5, -50) -> (-70.5, -50) projected
  line L1 (-72.5, -48) -> (-72.5, 48) projected
  circle A1 centre (68, 45.5) radius 2.2
  line L2 (72.5, 48) -> (72.5, -35) projected
  line L3 (-70.5, 50) -> (70.5, 50) projected
  point P0 (0, 0)
  dimension "d125" = 4.4
  dimension "d126" = 5.5
  dimension "d127" = 5.5
  dimension "d128" = 4.4
  dimension "d129" = 4.5
  dimension "d130" = 4.5
extrude "Vysunutí14" cut sketch "Náčrt23" against normal blind 8
sketch "Náčrt24" plane through (47, -27, 3) normal (0, 0, 1) x (1, 0, 0)
  point P0 (-47, 27)
properties part number "Krabicka_dolni_3D tisk"
